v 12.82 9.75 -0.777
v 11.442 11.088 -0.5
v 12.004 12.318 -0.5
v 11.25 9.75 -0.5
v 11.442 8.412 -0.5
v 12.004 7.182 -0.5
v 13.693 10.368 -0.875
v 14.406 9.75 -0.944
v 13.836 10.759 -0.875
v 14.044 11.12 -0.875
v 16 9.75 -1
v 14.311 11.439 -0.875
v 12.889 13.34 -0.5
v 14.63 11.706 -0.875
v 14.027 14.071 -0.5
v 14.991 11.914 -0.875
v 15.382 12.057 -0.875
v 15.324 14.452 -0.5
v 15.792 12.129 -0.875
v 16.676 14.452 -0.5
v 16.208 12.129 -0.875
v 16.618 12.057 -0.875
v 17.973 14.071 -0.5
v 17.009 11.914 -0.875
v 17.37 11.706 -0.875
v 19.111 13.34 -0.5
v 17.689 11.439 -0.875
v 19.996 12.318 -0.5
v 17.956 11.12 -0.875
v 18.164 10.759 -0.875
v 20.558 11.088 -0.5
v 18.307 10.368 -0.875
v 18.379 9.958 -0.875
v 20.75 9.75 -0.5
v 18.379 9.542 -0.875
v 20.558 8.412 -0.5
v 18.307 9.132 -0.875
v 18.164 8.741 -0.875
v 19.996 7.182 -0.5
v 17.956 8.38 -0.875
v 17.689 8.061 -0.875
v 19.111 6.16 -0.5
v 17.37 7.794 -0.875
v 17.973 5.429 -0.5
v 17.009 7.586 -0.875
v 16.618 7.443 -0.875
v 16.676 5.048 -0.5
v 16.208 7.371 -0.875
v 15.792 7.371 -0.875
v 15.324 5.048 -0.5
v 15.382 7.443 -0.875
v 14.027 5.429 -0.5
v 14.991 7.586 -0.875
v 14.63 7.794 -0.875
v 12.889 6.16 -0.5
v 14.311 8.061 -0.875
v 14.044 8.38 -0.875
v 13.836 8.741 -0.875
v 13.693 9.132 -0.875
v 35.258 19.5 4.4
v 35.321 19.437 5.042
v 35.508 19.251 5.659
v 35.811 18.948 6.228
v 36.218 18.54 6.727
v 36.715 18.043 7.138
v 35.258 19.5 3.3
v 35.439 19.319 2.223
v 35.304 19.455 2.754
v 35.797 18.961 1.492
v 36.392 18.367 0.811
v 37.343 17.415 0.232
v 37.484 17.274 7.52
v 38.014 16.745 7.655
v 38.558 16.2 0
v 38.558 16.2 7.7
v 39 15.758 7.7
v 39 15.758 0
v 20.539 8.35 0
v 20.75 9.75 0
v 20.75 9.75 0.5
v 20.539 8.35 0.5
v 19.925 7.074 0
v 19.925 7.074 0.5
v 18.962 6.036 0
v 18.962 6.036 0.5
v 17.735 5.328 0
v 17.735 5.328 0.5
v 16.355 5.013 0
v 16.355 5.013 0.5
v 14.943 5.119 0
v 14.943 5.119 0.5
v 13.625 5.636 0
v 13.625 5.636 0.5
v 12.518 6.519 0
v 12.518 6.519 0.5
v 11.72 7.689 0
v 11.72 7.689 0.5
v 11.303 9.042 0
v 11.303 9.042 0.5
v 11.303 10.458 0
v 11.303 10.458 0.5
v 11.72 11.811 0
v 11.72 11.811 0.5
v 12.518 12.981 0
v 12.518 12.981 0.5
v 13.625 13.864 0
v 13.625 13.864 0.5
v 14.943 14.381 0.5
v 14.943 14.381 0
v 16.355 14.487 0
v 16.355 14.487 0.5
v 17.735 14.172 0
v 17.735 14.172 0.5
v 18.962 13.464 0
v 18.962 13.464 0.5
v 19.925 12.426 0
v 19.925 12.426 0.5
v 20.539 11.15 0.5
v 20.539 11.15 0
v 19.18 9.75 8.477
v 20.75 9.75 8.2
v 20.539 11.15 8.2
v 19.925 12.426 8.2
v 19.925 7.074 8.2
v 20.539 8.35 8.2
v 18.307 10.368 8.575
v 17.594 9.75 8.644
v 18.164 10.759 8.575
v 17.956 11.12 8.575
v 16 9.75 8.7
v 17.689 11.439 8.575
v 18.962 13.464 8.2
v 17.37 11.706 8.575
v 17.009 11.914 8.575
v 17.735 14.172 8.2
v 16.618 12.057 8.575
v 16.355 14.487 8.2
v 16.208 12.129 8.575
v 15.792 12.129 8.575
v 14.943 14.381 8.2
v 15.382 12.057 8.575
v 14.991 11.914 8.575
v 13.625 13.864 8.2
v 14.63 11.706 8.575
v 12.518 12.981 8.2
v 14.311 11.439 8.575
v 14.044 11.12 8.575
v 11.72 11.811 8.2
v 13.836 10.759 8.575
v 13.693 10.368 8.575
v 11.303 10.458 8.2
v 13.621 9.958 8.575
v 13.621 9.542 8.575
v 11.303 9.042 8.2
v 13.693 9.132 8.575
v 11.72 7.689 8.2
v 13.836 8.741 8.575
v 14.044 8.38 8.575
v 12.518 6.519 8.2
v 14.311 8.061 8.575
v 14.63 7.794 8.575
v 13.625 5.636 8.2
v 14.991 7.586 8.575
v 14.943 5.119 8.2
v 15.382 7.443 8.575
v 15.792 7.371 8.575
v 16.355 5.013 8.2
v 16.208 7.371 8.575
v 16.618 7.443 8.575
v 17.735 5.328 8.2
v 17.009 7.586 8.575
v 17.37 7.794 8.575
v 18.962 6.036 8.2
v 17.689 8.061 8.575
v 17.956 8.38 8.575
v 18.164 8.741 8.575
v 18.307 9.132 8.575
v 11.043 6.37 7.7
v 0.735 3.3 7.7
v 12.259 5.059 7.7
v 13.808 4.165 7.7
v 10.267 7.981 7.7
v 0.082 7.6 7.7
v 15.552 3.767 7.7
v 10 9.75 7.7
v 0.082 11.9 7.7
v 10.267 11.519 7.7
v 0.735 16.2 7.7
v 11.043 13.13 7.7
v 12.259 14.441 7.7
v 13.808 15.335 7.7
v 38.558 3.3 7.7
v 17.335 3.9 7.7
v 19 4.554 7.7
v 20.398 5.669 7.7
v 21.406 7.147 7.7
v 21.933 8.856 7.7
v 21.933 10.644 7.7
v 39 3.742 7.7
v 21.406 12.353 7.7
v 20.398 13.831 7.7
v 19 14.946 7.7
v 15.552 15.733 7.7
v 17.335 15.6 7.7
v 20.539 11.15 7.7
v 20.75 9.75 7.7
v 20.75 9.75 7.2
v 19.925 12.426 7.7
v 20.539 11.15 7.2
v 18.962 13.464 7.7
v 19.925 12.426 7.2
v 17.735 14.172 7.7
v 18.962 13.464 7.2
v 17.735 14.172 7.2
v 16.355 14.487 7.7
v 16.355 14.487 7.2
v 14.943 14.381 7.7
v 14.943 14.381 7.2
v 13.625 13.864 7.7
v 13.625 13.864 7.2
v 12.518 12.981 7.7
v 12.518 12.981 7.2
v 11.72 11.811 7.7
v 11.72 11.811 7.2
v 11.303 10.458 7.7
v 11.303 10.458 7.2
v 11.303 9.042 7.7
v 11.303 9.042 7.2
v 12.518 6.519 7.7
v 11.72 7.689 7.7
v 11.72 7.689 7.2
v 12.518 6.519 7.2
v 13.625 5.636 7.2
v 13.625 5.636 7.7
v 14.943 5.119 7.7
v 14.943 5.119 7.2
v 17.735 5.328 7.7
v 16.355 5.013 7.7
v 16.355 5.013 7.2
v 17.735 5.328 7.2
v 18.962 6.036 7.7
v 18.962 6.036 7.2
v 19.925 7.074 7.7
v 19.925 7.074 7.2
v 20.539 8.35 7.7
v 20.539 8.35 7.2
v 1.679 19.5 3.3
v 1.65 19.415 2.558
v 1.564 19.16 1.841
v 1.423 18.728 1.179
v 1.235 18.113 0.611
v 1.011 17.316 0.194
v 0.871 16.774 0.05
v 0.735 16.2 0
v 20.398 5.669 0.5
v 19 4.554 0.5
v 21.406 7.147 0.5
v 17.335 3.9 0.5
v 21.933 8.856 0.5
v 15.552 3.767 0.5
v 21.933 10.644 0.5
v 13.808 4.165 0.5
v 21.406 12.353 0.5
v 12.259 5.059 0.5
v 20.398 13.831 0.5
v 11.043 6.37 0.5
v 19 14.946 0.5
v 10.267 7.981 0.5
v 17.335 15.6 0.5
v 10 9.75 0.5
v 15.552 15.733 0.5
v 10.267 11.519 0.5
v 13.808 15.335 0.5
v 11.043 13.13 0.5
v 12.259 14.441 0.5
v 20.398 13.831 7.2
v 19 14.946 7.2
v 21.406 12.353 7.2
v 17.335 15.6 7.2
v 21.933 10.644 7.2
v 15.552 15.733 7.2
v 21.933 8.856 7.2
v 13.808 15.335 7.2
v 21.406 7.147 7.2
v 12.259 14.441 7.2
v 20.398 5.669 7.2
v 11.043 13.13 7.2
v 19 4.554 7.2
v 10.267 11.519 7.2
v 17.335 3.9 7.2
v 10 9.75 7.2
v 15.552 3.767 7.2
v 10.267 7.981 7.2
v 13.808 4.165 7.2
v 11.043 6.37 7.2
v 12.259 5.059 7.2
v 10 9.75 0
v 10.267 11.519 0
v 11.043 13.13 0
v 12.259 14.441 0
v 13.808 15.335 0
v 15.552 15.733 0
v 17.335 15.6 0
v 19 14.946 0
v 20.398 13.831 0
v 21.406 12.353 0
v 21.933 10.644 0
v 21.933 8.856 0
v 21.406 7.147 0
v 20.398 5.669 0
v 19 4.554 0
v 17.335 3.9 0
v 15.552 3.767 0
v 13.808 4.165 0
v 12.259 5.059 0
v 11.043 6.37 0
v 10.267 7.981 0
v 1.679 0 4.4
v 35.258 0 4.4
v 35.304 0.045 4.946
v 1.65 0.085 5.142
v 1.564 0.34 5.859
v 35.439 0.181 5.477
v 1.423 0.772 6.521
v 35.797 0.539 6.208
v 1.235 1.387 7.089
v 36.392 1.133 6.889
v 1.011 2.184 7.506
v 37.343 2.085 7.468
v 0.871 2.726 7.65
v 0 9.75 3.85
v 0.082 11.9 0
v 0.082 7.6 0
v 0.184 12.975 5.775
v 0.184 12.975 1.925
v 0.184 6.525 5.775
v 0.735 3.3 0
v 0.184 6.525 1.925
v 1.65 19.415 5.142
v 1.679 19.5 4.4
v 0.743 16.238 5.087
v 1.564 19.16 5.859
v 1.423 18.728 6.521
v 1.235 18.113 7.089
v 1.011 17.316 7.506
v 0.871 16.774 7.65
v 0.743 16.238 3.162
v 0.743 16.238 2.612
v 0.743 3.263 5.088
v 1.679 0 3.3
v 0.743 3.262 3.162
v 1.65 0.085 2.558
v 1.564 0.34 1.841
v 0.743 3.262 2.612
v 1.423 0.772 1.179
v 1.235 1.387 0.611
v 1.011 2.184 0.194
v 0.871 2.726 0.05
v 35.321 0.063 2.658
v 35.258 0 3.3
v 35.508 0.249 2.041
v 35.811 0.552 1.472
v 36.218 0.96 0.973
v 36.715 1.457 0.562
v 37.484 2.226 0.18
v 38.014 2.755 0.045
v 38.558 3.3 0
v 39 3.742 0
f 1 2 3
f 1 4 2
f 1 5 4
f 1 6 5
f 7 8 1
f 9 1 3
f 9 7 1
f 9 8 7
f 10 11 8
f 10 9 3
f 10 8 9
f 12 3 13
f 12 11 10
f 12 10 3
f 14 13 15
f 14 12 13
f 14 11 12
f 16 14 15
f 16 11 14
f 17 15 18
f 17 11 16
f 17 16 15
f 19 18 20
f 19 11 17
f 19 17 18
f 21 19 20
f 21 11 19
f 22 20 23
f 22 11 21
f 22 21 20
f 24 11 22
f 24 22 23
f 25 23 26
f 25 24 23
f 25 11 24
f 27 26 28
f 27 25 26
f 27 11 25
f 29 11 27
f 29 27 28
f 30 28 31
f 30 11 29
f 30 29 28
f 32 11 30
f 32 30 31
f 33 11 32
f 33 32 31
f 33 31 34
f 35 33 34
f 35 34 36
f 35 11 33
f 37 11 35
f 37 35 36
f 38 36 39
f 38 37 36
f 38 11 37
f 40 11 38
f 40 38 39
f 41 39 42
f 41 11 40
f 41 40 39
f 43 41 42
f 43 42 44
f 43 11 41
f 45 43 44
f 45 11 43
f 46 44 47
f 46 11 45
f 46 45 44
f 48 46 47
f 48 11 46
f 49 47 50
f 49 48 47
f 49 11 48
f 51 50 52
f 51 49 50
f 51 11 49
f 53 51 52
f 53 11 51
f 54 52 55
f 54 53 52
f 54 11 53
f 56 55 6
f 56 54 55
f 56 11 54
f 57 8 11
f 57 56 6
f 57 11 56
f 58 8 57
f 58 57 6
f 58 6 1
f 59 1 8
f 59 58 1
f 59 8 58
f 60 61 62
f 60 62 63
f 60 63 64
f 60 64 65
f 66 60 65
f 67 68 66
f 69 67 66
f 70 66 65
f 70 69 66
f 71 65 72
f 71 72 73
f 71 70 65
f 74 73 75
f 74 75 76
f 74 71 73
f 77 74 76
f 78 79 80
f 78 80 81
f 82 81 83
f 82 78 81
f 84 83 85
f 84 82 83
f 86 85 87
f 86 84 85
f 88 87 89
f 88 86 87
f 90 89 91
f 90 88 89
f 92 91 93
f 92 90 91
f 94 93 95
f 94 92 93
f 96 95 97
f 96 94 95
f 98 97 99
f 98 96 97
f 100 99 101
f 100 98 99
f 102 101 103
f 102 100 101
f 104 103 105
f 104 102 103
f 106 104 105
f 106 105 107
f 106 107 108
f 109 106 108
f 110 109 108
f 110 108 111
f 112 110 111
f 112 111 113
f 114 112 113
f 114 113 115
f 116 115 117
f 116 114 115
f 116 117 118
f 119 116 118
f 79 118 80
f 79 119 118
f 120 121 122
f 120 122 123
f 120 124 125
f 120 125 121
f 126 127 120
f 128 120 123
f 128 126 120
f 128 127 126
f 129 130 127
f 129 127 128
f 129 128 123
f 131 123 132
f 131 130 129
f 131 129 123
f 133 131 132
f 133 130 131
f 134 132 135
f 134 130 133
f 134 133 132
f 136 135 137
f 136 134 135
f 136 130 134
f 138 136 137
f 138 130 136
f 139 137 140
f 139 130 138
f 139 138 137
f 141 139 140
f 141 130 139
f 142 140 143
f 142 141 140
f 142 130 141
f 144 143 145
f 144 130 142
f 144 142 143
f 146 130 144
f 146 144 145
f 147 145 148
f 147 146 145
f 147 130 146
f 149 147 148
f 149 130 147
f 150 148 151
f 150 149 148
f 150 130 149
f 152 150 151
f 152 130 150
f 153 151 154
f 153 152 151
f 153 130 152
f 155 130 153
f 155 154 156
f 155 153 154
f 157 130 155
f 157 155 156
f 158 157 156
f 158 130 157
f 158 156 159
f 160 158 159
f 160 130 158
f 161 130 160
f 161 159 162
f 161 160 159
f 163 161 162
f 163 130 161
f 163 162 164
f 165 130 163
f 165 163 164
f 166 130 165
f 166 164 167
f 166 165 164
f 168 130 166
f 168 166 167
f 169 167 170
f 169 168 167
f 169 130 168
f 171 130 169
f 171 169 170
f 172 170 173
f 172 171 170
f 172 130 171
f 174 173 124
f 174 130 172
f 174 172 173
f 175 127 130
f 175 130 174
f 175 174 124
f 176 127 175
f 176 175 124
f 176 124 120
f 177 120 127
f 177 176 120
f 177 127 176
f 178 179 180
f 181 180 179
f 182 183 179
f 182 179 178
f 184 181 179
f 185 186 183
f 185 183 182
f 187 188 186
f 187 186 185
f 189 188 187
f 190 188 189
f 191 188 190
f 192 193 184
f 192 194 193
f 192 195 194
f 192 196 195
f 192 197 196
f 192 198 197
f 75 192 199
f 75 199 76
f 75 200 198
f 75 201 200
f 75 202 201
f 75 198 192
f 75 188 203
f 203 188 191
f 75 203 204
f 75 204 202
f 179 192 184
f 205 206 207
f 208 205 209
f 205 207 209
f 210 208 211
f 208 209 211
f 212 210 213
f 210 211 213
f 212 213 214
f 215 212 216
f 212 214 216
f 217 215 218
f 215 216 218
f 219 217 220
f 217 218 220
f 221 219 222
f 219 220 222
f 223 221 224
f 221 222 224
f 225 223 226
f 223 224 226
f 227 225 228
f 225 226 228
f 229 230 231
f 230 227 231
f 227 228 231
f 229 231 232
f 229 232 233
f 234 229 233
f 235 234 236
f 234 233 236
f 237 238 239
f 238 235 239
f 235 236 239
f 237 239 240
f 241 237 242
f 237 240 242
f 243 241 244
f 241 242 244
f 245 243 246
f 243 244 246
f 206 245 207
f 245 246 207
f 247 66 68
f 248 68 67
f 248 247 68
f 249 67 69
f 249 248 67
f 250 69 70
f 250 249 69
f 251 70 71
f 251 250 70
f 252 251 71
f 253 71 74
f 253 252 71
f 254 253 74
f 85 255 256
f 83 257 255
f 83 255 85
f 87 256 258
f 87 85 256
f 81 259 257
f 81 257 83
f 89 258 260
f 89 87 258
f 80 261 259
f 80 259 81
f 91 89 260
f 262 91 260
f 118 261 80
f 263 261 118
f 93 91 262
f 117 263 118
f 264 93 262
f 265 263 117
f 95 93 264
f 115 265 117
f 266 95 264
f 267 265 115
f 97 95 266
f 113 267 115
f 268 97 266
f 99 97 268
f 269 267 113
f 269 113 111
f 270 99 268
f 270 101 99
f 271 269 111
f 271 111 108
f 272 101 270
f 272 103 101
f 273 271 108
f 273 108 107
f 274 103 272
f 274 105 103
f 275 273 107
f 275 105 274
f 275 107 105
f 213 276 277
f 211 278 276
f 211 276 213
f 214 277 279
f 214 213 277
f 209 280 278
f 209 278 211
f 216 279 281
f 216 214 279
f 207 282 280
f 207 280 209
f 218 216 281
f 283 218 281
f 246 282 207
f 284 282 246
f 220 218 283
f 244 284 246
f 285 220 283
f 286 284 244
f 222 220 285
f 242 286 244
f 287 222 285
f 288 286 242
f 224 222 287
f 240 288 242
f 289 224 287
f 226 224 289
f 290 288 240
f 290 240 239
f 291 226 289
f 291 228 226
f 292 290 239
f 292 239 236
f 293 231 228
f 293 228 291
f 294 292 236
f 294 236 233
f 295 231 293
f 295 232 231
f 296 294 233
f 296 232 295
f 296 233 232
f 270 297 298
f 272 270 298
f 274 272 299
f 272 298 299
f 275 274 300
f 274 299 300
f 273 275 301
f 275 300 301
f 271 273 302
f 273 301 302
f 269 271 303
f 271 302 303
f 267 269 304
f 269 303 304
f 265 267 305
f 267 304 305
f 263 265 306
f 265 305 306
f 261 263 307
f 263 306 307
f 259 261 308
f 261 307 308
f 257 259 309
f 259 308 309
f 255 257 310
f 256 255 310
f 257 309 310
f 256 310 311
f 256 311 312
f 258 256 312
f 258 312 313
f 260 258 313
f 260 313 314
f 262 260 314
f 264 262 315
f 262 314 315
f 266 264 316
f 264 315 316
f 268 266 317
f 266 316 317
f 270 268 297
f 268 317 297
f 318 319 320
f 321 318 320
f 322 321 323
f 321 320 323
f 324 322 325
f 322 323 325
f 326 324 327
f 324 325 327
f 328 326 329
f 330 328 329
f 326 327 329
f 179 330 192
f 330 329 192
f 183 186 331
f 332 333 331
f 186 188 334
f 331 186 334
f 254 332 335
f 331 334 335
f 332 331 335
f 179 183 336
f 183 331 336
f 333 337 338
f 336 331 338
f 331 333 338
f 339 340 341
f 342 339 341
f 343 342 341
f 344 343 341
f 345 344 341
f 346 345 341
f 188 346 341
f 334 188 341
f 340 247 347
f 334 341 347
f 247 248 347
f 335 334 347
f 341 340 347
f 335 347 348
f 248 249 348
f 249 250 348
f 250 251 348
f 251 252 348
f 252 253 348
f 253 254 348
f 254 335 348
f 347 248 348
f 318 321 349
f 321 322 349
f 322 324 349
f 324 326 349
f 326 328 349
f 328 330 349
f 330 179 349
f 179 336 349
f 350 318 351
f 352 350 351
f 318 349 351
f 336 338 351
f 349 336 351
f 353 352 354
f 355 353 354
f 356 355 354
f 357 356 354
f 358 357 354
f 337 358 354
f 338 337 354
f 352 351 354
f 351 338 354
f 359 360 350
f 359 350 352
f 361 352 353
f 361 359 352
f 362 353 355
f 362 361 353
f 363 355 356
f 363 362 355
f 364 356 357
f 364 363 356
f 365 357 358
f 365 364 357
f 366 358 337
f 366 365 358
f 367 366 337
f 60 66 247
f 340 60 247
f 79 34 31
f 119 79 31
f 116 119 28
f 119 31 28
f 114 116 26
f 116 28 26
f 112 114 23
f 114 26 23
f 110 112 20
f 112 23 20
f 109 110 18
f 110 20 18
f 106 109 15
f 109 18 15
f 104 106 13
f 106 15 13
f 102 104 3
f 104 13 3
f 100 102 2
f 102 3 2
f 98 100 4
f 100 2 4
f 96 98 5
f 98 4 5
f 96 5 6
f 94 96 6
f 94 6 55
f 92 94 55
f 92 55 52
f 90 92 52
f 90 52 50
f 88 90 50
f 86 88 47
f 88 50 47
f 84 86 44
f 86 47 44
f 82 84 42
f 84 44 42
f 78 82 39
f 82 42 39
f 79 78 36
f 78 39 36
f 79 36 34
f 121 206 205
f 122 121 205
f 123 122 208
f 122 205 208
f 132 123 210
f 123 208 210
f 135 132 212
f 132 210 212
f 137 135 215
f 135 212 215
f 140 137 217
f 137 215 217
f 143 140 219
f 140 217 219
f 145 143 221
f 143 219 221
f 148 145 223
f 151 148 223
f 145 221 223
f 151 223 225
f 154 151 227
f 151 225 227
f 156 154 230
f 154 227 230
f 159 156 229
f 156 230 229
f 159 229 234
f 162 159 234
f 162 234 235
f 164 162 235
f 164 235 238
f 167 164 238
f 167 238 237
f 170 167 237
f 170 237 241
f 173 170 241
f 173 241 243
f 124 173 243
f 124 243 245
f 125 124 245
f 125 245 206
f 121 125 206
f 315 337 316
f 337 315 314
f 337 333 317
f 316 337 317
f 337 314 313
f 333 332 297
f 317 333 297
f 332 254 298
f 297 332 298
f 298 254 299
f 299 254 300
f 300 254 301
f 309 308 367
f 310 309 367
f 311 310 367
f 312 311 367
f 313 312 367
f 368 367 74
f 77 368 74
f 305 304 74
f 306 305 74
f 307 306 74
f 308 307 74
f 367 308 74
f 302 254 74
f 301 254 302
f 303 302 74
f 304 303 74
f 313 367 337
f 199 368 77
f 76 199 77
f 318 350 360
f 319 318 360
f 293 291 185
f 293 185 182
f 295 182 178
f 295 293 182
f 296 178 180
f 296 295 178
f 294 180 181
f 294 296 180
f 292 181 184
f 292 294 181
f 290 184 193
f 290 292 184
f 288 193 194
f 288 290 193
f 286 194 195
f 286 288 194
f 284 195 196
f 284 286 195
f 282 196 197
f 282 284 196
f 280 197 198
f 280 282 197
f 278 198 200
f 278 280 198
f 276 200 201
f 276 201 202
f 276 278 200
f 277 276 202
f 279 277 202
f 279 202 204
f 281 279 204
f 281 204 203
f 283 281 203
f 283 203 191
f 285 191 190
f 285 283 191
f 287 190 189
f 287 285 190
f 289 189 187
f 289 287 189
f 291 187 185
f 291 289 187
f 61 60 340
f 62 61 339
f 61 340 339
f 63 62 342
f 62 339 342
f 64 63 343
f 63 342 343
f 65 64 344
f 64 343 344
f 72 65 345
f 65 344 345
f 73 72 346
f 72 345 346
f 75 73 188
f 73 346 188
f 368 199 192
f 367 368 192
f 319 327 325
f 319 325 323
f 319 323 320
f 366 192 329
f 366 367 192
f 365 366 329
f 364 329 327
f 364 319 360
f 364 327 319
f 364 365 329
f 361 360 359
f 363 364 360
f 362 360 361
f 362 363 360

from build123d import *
from build123d.topology import SkipClean

# Parameters (mm, degrees)
BOSS_EXTRUDE1_DEPTH      = 7.7
FILLET1_R                = 3.3
CUT_EXTRUDE1_DEPTH       = 14.5
BOSS_EXTRUDE2_DEPTH      = 0.5
BOSS_EXTRUDE2_DEPTH_BACK = 8.2
SKETCH3_R                = 4.75
DOME1_FACE_RADIUS        = 4.75
DOME1_HEIGHT             = 0.5
DOME2_FACE_RADIUS        = 4.75
DOME2_HEIGHT             = 0.5
SKETCH4_R                = 6
SKETCH4_R_2              = 4.75
CUT_EXTRUDE2_DEPTH       = 0.5
CUT_EXTRUDE3_START       = -0.5
SKETCH5_R                = 6
SKETCH5_R_2              = 4.75
CUT_EXTRUDE3_DEPTH       = 0.5


with BuildPart() as part:
    # Sketch1 → Boss-Extrude1 (new body)
    with BuildSketch(Plane.XY):
        with BuildLine():
            Line((1.678605479, 0), (39, 0))
            Line((39, 0), (39, 19.5))
            Line((39, 19.5), (1.678605479, 19.5))
            add(Edge.make_bspline(
                [(1.678605479, 19.5), (-1.678605479, 9.75), (1.678605479, 0)],
                knots=[0, 0, 0, 1, 1, 1], degree=2))
        make_face()
    extrude(amount=BOSS_EXTRUDE1_DEPTH)

    # Fillet1
    fillet1_edges = [part.edges().sort_by_distance(p)[0] for p in [
        (20.339302739, 0, 7.7),
        (20.339302739, 0, 0),
        (20.339302739, 19.5, 0),
        (20.339302739, 19.5, 7.7),
    ]]
    fillet(fillet1_edges, radius=FILLET1_R)

    # Sketch2 → Cut-Extrude1 (cut)
    with BuildSketch(Plane.XY):
        Polygon((35.25816866, 19.5), (39, 15.75816866), (39, 3.74183134), (35.25816866, 0), (41.546520984, 0), (41.546520984, 19.5), align=None)
    extrude(amount=CUT_EXTRUDE1_DEPTH, mode=Mode.SUBTRACT)

    # Sketch3 → Boss-Extrude2 (add, two sides: drawn at the far end of the back side and taken through both)
    with BuildSketch(Plane.XY.offset(7.7).offset(-BOSS_EXTRUDE2_DEPTH_BACK)):
        with Locations((16, 9.75)):
            Circle(SKETCH3_R)
    extrude(amount=BOSS_EXTRUDE2_DEPTH + BOSS_EXTRUDE2_DEPTH_BACK)

    # Dome1: a dome of height H over a round flat face of radius A is a cap of a sphere of radius (A * A + H * H) / (2 * H)
    dome1_r = (DOME1_FACE_RADIUS * DOME1_FACE_RADIUS + DOME1_HEIGHT * DOME1_HEIGHT) / (2 * DOME1_HEIGHT)
    dome1_base = Plane((16, 9.75, 8.2), z_dir=(0, 0, 1))
    with Locations(dome1_base.offset(DOME1_HEIGHT - dome1_r)):
        dome1_ball = Sphere(dome1_r, mode=Mode.PRIVATE)
    add(split(dome1_ball, bisect_by=dome1_base, keep=Keep.TOP, mode=Mode.PRIVATE))

    # Dome2: a dome of height H over a round flat face of radius A is a cap of a sphere of radius (A * A + H * H) / (2 * H)
    dome2_r = (DOME2_FACE_RADIUS * DOME2_FACE_RADIUS + DOME2_HEIGHT * DOME2_HEIGHT) / (2 * DOME2_HEIGHT)
    dome2_base = Plane((16, 9.75, -0.5), z_dir=(0, 0, -1))
    with Locations(dome2_base.offset(DOME2_HEIGHT - dome2_r)):
        dome2_ball = Sphere(dome2_r, mode=Mode.PRIVATE)
    add(split(dome2_ball, bisect_by=dome2_base, keep=Keep.TOP, mode=Mode.PRIVATE))

    # Sketch4 → Cut-Extrude2 (cut)
    with BuildSketch(Plane(origin=(0, 0, 0), x_dir=(-1, 0, 0), z_dir=(0, 0, -1))):
        with Locations((-16, 9.75)):
            Circle(SKETCH4_R)
        with Locations(Location((-16, 9.75, 0), (0, 0, 180))):
            Circle(SKETCH4_R_2, mode=Mode.SUBTRACT)
    extrude(amount=-CUT_EXTRUDE2_DEPTH, mode=Mode.SUBTRACT)

    # Sketch5 → Cut-Extrude3 (cut)
    with SkipClean():  # the faces are left unmerged after this step: merging them gives an invalid solid
        with BuildSketch(Plane.XY.offset(7.7).offset(CUT_EXTRUDE3_START)):
            with Locations(Location((16, 9.75, 0), (0, 0, 180))):
                Circle(SKETCH5_R)
            with Locations((16, 9.75)):
                Circle(SKETCH5_R_2, mode=Mode.SUBTRACT)
        extrude(amount=CUT_EXTRUDE3_DEPTH, mode=Mode.SUBTRACT)


solid = part.part
